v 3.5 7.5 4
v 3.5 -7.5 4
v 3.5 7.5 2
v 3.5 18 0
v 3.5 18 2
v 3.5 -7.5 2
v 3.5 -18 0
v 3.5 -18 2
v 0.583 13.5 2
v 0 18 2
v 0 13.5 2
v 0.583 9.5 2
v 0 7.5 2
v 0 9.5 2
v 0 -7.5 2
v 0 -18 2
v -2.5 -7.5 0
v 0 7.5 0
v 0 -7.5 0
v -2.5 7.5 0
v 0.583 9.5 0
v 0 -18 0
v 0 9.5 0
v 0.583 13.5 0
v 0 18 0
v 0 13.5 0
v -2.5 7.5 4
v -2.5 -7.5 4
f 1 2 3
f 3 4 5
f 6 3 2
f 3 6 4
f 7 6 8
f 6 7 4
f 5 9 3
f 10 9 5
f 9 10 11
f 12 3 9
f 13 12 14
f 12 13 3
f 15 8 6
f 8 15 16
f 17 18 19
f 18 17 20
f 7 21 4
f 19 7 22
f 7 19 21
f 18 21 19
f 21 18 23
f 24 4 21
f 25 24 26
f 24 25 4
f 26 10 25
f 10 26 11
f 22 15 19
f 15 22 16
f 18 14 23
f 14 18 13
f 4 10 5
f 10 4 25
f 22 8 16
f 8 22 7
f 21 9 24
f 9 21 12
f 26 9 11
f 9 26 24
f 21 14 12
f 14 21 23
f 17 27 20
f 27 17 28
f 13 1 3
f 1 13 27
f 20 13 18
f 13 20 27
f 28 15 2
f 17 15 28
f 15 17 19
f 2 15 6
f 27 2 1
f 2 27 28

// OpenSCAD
$fn=50;

ts=2;
a1=36;
a2=30;
fp=2.5;
hz=3.5;
dd=[8.5,4];

all1();

module all(){

    translate([hz/2,0,ts/2])cube([hz,a1,ts],true);
    translate([-fp/2,0,ts/2])cube([fp,a2,ts],true);
    translate([(fp+hz)/2-fp,0,ts])cube([fp+hz,a2/2,2*ts],true);

}

module all1(){
    difference(){
        translate([hz/2,0,ts/2])cube([hz,a1,ts],true);
        translate([0,a1/2-dd.x+dd.y/2,ts/2])cube([hz/3,dd.y,ts*2],true);
    }
    
    translate([-fp/2,0,ts/2])cube([fp,a2/2,ts],true);
    translate([(fp+hz)/2-fp,0,ts])cube([fp+hz,a2/2,2*ts],true);

}
